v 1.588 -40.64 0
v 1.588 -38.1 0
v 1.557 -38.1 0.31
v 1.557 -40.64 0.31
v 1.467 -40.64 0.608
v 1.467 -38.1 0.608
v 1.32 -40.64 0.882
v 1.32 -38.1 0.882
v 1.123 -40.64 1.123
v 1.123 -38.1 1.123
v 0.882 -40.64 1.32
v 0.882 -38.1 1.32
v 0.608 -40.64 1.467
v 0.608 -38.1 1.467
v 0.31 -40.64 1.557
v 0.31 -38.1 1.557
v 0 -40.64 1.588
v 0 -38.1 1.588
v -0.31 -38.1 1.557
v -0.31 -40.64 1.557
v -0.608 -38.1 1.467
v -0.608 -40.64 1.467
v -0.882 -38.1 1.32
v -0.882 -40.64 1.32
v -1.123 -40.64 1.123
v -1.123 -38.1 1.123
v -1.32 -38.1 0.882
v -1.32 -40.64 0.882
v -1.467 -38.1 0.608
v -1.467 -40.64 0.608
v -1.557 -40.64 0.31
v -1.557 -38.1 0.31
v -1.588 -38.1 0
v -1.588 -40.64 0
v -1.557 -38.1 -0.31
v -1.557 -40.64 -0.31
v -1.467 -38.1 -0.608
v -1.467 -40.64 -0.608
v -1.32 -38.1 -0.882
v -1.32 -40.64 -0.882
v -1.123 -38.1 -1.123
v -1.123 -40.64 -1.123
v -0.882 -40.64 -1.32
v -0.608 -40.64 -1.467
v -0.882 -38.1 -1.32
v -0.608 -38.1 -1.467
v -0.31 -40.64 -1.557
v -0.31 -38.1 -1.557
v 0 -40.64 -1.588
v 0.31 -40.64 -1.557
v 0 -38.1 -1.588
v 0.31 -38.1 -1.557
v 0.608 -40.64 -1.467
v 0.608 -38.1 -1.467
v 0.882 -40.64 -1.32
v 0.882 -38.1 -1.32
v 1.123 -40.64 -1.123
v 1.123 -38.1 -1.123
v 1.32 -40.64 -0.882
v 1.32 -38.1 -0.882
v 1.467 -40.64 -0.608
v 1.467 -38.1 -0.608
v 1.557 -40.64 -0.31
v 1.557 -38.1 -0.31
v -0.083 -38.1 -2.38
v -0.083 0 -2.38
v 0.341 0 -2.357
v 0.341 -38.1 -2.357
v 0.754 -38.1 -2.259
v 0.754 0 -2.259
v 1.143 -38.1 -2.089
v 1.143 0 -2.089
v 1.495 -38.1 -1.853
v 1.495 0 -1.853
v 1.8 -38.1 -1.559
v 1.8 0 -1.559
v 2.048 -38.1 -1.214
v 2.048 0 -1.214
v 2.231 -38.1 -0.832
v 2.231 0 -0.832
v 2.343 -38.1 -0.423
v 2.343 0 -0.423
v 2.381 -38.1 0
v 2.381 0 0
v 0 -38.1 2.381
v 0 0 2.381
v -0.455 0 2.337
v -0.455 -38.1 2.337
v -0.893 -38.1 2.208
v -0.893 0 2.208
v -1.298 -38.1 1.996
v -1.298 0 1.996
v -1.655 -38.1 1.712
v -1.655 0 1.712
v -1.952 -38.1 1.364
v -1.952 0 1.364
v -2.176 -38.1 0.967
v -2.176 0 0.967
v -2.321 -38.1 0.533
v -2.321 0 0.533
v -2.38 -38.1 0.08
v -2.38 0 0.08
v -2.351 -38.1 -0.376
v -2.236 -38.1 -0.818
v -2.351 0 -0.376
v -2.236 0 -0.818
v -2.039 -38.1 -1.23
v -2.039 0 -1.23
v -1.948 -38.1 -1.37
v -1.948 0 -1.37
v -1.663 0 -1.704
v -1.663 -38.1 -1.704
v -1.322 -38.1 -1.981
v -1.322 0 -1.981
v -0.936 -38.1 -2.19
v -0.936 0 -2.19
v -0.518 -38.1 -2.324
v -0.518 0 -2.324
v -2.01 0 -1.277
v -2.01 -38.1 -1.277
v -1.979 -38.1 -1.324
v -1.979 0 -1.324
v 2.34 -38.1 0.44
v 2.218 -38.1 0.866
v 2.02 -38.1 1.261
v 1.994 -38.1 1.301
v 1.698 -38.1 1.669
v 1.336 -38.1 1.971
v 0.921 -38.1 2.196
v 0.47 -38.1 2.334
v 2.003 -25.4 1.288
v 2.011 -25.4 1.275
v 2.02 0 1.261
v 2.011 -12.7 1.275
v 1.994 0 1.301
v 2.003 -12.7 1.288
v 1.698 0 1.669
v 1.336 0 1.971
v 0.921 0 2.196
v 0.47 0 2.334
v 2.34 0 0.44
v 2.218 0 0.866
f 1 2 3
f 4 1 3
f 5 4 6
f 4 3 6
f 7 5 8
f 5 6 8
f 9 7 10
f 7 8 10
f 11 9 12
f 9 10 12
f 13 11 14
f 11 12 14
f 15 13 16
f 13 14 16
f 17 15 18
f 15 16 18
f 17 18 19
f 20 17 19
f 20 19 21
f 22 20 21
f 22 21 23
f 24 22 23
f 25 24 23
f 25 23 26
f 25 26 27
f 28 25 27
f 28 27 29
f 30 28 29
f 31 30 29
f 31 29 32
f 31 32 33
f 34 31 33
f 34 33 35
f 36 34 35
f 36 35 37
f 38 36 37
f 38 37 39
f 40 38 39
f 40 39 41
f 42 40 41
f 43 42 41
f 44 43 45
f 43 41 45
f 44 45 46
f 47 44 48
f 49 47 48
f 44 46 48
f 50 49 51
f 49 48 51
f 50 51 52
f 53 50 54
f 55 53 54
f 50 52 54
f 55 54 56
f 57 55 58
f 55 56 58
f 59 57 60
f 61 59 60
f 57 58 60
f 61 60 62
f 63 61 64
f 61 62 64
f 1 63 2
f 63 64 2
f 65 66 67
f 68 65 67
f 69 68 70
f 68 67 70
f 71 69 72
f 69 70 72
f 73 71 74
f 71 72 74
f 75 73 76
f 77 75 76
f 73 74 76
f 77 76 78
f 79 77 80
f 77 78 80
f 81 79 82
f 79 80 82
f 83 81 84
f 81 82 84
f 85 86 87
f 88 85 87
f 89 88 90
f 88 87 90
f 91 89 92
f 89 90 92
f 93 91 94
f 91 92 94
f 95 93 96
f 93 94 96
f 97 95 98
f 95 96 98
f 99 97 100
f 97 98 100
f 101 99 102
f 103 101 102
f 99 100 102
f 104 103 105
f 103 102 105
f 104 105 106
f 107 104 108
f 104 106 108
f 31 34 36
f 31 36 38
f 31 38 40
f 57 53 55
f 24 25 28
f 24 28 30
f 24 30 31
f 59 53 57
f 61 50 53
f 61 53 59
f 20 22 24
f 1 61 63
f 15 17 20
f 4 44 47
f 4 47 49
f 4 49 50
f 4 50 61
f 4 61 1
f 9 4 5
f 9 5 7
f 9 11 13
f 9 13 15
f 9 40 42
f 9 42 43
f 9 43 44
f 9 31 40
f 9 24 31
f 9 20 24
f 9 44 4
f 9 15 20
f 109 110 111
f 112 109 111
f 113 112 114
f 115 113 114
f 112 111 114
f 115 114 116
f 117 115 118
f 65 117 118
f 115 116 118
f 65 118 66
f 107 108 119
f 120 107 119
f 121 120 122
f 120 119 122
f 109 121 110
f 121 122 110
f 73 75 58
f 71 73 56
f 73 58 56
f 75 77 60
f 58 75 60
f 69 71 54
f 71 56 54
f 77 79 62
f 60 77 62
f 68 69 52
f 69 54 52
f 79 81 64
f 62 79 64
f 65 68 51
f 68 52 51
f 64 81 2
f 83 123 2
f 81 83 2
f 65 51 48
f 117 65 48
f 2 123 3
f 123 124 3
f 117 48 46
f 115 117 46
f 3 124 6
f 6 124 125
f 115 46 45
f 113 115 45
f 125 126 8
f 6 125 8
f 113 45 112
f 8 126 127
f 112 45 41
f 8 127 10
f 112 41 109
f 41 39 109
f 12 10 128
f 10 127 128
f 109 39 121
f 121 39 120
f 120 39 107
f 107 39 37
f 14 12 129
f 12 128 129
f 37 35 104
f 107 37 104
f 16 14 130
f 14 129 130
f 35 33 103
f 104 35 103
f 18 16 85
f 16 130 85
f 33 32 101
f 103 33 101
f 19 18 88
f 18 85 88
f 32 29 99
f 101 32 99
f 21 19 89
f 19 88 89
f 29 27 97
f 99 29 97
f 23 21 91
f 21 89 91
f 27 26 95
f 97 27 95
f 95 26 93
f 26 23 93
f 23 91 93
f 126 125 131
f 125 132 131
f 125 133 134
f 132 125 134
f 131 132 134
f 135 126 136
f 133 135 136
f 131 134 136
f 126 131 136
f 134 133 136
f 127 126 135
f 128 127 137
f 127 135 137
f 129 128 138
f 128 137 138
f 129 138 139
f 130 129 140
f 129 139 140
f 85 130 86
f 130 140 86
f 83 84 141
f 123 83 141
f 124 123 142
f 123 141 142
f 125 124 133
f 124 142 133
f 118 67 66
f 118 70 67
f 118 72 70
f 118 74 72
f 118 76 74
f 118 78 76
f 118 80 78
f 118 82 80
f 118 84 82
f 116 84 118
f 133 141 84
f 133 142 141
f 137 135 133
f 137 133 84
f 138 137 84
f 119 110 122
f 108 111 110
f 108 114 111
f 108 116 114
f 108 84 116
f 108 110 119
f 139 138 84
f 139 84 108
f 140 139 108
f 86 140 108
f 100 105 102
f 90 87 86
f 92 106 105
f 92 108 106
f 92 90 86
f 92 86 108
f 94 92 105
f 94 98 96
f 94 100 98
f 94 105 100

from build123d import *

# Parameters (mm, degrees)
F0_R     = 1.5875
F1_DEPTH = 38.1
F2_DEPTH = 40.64


with BuildPart() as f1:
    # F0 (on Front) → F1 (new body)
    with BuildSketch(Plane.XZ):
        with BuildLine():
            add(Edge.make_bspline(
                [(-2.039045, -1.229896), (-2.008193, -1.275858), (-1.977766, -1.322509), (-1.947774, -1.369864)],
                knots=[27.094619, 27.094619, 27.094619, 27.094619, 27.26278, 27.26278, 27.26278, 27.26278], degree=3))
            ThreePointArc((-2.039045, -1.229896), (-1.994638, -1.300681), (-1.947774, -1.369864))
        make_face()
        with BuildLine():
            add(Edge.make_bspline(
                [(2.019846, 1.26118), (2.011239, 1.274554), (2.002664, 1.287985), (1.994123, 1.301471)],
                knots=[27.195118, 27.195118, 27.195118, 27.195118, 27.242974, 27.242974, 27.242974, 27.242974], degree=3))
            ThreePointArc((1.994123, 1.301471), (1.133848, 2.093977), (0, 2.38125))
            ThreePointArc((0, 2.38125), (-2.073529, 1.170825), (-2.039045, -1.229896))
            add(Edge.make_bspline(
                [(-2.039045, -1.229896), (-2.008193, -1.275858), (-1.977766, -1.322509), (-1.947774, -1.369864)],
                knots=[27.094619, 27.094619, 27.094619, 27.094619, 27.26278, 27.26278, 27.26278, 27.26278], degree=3))
            ThreePointArc((-1.947774, -1.369864), (-1.133848, -2.093977), (-0.082606, -2.379817))
            ThreePointArc((-0.082606, -2.379817), (1.654335, -1.712755), (2.38125, 0))
            ThreePointArc((2.38125, 0), (2.289117, 0.65597), (2.019846, 1.26118))
        make_face()
        Circle(F0_R, mode=Mode.SUBTRACT)
    extrude(amount=F1_DEPTH)

    # F0 (on Front) → F2 (join)
    with BuildSketch(Plane.XZ):
        Circle(F0_R)
    extrude(amount=F2_DEPTH)


solid = f1.part
